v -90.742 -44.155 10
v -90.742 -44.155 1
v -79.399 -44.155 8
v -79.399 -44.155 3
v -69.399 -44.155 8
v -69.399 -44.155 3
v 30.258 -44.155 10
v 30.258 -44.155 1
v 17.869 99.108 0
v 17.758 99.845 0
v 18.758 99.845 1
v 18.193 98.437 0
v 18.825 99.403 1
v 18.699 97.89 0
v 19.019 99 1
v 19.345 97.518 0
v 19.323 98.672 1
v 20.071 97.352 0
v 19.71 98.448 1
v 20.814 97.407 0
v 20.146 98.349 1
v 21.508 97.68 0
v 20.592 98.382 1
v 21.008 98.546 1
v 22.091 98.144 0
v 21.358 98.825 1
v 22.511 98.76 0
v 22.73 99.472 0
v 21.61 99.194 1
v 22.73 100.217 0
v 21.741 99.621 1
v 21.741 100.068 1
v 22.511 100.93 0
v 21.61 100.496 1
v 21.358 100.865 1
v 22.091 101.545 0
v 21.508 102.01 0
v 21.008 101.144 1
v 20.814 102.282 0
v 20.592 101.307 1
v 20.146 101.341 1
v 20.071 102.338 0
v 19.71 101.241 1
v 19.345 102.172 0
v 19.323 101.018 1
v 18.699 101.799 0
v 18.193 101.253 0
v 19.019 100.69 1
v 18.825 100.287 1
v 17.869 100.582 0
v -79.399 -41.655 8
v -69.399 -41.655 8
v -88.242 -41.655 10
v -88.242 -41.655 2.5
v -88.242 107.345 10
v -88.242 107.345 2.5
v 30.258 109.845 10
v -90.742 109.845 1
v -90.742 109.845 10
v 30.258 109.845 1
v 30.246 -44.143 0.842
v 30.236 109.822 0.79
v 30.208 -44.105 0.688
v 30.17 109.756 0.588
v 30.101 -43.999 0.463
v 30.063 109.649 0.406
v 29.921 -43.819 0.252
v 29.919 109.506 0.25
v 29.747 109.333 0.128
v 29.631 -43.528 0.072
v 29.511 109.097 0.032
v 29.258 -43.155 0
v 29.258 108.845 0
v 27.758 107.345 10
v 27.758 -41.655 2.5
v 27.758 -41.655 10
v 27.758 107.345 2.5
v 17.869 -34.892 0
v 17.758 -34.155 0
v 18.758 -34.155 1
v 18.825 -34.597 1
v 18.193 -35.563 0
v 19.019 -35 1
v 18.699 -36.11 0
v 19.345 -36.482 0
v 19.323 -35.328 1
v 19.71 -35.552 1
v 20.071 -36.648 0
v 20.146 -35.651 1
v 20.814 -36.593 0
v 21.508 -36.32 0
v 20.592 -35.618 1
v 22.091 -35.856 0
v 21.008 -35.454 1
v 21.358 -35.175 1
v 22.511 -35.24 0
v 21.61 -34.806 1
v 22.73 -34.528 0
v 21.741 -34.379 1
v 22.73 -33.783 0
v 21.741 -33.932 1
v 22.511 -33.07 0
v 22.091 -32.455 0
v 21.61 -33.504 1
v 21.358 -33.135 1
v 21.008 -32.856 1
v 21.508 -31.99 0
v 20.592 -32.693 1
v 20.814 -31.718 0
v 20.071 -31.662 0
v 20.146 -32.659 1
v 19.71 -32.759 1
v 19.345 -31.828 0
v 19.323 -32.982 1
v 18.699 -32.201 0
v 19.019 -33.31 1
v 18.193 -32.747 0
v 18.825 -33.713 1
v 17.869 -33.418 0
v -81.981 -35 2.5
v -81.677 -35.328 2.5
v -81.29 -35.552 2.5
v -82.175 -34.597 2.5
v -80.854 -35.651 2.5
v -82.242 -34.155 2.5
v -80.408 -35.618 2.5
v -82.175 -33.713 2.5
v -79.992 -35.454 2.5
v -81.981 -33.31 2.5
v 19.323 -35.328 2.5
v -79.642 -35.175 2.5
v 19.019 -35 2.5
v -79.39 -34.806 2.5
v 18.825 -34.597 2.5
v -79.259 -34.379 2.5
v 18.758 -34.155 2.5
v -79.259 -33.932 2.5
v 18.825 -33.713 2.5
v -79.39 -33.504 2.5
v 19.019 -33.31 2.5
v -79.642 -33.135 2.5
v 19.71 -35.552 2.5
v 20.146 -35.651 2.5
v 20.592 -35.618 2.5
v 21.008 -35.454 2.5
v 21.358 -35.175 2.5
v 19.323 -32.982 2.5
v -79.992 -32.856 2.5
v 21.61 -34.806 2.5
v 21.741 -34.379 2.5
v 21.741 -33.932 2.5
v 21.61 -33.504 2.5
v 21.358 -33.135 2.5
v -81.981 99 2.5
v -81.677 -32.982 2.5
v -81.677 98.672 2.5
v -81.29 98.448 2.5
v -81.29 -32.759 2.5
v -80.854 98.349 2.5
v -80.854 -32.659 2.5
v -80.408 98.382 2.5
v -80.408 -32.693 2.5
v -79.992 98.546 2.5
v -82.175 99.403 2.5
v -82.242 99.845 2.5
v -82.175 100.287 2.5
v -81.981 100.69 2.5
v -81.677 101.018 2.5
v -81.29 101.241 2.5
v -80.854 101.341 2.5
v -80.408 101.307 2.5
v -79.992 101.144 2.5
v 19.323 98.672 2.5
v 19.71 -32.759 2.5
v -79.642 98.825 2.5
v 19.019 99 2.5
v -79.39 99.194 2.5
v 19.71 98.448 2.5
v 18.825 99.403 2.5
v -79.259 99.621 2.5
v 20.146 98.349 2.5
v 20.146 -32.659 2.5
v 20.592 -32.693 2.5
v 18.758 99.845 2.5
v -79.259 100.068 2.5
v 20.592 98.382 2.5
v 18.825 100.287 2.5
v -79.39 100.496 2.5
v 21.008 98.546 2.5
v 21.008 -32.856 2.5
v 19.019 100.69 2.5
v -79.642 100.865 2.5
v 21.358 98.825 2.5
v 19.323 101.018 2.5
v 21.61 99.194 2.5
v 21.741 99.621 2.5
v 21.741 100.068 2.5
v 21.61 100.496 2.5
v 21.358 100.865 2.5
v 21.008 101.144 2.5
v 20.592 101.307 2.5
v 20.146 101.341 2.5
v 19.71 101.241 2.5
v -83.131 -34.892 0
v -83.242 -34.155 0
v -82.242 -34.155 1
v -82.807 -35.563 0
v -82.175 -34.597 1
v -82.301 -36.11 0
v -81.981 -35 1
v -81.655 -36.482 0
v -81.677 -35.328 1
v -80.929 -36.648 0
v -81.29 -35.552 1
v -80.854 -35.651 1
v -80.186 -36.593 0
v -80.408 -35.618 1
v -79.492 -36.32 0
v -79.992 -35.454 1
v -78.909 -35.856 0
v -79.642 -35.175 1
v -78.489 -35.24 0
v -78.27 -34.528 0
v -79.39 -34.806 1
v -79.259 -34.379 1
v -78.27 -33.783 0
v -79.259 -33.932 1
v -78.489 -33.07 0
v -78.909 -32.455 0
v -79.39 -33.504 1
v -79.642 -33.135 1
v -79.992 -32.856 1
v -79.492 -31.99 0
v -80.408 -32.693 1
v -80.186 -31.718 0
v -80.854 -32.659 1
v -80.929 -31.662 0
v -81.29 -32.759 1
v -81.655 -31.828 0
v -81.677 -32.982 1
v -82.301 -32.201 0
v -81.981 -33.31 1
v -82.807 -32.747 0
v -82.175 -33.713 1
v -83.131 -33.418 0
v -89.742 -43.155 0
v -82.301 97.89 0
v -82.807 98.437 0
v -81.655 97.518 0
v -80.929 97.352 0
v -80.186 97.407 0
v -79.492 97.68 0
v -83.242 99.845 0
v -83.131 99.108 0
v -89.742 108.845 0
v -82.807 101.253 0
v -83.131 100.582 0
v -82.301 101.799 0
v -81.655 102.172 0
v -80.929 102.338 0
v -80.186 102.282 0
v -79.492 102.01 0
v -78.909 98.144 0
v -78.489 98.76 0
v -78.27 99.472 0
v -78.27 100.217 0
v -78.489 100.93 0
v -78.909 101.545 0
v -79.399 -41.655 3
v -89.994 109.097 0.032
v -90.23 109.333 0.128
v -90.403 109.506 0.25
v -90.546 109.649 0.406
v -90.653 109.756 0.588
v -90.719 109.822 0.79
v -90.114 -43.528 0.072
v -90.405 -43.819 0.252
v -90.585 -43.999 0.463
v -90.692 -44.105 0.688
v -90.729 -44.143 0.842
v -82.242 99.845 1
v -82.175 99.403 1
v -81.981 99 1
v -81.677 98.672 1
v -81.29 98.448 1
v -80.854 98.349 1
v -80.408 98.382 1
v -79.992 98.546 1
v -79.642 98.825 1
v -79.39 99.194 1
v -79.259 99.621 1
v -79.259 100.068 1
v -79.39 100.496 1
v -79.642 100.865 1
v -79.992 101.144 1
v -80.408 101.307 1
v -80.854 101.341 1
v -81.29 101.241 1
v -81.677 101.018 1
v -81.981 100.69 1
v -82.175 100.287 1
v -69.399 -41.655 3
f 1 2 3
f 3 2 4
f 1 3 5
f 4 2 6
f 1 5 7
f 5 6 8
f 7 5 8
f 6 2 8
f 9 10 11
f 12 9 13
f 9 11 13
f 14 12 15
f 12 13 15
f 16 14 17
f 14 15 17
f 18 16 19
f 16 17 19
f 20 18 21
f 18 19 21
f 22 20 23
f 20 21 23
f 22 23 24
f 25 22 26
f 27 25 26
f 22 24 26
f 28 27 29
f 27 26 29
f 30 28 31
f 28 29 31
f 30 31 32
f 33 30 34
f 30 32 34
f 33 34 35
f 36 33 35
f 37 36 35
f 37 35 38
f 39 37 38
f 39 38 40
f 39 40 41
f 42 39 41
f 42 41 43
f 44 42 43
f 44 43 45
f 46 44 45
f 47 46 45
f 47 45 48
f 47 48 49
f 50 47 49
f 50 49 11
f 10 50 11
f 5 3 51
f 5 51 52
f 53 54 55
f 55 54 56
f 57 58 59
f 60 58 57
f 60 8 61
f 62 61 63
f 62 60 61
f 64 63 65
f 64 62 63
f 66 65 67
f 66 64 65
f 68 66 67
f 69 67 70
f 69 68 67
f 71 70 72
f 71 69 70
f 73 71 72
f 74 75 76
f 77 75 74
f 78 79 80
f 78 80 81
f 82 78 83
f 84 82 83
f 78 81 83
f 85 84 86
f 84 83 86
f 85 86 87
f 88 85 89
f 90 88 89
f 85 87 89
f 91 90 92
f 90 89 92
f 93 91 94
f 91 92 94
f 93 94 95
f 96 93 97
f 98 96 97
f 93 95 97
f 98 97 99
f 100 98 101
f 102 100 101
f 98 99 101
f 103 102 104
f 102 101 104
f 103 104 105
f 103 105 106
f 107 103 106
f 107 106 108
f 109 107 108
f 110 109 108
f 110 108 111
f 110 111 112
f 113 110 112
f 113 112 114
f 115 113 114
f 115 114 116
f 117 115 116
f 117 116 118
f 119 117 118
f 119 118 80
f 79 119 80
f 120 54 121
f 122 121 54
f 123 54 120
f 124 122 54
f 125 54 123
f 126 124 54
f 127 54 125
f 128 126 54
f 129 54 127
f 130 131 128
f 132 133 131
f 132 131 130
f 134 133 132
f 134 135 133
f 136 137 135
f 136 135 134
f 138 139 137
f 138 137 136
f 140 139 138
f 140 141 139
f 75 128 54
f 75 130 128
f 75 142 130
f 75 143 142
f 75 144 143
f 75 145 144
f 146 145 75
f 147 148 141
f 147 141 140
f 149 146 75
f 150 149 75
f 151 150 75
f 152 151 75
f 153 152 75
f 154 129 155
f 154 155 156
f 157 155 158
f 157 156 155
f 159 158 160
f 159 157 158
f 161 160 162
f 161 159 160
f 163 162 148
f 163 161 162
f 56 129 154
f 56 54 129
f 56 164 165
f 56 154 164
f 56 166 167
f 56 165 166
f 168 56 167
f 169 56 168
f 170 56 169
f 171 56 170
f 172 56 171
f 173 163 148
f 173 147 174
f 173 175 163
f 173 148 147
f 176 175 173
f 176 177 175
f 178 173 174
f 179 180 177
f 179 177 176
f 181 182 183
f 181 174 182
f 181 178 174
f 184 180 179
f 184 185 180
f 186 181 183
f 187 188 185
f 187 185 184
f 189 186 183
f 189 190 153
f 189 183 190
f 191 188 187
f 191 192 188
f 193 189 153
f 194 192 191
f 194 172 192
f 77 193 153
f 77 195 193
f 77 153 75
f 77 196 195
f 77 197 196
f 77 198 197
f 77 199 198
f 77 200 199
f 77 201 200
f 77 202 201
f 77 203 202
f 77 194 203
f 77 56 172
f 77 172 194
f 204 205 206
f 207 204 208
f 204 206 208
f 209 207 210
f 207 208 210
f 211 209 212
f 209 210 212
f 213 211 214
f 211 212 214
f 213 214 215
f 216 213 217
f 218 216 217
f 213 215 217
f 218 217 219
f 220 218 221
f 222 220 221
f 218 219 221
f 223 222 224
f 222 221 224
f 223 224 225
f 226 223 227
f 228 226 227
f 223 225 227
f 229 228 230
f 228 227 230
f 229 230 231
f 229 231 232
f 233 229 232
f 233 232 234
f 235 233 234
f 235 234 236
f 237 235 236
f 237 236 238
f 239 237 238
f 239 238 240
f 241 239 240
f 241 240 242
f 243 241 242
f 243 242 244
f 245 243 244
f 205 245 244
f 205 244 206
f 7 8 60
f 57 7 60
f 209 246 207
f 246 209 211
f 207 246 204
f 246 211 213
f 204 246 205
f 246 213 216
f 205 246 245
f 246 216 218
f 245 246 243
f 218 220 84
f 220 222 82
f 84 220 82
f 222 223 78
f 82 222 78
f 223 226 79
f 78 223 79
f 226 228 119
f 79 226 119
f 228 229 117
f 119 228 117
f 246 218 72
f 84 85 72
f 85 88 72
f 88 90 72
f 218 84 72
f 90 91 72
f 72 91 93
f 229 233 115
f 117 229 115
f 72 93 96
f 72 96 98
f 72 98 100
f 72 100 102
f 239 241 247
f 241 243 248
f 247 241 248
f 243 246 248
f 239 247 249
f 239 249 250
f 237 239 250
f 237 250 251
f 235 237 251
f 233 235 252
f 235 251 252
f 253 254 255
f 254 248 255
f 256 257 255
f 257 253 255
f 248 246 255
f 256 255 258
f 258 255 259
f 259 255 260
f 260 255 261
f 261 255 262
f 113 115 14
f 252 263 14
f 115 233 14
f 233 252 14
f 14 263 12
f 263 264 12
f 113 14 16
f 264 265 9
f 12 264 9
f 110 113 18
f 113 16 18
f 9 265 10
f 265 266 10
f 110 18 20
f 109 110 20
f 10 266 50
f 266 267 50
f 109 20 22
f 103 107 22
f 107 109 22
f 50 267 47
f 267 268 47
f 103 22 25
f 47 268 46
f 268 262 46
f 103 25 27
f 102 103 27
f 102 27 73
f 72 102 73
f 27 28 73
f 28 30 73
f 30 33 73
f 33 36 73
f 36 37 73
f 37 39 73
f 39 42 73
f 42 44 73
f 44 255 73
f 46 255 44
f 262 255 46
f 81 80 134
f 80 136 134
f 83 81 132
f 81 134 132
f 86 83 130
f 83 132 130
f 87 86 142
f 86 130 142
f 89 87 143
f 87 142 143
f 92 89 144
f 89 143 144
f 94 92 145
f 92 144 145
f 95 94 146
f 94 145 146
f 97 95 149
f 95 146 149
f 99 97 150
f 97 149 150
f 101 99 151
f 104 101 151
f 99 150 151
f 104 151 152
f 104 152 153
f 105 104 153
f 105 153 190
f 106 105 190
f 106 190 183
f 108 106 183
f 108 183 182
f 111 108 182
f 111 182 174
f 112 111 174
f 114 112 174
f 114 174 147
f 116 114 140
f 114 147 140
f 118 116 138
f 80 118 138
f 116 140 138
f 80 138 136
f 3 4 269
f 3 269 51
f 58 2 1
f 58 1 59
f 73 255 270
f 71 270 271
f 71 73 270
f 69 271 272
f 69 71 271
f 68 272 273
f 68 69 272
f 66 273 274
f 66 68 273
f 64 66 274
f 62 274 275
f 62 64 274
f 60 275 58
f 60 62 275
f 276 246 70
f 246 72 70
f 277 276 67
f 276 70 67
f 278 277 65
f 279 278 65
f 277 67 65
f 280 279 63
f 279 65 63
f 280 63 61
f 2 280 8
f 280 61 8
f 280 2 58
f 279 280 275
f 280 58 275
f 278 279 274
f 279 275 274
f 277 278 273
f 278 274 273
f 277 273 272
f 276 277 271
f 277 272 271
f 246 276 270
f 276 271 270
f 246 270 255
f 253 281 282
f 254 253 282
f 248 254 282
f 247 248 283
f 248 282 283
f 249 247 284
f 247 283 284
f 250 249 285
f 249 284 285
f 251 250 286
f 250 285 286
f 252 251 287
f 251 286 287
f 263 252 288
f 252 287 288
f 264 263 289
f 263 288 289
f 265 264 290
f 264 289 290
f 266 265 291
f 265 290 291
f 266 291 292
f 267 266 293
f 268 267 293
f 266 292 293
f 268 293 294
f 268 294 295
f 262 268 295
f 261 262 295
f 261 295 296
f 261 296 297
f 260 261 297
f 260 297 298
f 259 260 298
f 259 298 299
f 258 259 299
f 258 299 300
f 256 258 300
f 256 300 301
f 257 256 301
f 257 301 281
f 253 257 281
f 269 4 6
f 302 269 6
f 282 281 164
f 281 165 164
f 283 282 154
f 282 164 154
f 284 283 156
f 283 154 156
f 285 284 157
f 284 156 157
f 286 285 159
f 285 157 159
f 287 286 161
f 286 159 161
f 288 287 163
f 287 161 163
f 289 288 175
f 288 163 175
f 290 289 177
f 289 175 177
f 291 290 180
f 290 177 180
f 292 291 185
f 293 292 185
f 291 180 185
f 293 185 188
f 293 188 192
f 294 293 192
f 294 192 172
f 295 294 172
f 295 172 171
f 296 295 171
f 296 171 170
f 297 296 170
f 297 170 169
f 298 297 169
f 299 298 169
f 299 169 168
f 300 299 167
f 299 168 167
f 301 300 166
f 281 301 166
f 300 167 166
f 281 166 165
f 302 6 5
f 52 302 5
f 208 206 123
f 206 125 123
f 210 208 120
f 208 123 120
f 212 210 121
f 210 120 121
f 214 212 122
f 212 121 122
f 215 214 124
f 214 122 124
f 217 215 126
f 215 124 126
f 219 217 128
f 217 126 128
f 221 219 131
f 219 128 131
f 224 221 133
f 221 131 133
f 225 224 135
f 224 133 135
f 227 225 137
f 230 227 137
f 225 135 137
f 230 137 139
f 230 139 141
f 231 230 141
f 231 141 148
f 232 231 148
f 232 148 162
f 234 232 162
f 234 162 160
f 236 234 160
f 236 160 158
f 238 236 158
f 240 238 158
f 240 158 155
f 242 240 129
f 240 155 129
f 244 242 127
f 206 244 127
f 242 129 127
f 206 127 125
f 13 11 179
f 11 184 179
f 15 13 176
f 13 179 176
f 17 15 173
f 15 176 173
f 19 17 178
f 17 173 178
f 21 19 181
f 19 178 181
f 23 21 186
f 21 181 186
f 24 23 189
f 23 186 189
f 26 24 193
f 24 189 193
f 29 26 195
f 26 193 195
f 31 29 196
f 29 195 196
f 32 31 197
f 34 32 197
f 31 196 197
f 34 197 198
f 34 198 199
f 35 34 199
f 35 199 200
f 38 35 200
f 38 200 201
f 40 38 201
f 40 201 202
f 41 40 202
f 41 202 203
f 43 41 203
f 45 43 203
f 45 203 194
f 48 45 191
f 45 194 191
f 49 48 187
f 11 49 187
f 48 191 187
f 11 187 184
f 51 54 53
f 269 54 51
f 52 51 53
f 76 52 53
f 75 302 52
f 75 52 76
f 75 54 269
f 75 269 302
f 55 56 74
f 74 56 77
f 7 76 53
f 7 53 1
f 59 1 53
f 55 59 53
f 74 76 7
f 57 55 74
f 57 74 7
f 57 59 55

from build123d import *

# Parameters (mm, degrees)
F0_W           = 121
F0_H           = 154
F1_DEPTH       = 10
F2_T           = -2.5
F4_D           = 3
F4_CSINK_D     = 5
F4_CSINK_ANGLE = 90
F5_R           = 1
F6_W           = 10
F6_H           = 5
F7_DEPTH       = 2.5


with BuildPart() as f1:
    # F0 (on Top) → F1 (new body)
    with BuildSketch(Plane.XY):
        with Locations((-30.2418641299, 32.8448046446)):
            Rectangle(F0_W, F0_H)
    extrude(amount=F1_DEPTH)

    # F2
    f2_openings = [f1.faces().sort_by_distance(p)[0] for p in [
        (-30.241864, 32.844805, 10),
    ]]
    offset(amount=F2_T, openings=f2_openings)

    # F4 (through all)
    with Locations(Plane(origin=(0, 0, 0), x_dir=(1, 0, 0), z_dir=(0, 0, -1))):
        with Locations((-80.7418641299, 34.1551953554), (20.2581358701, 34.1551953554), (-80.7418641299, -99.8448046446), (20.2581358701, -99.8448046446)):
            CounterSinkHole(F4_D / 2, F4_CSINK_D / 2, counter_sink_angle=F4_CSINK_ANGLE)

    # F5
    f5_edges = [f1.edges().sort_by_distance(p)[0] for p in [
        (-30.241864, -44.155195, 0),
        (-90.741864, 32.844805, 0),
        (30.258136, 32.844805, 0),
        (-30.241864, 109.844805, 0),
    ]]
    fillet(f5_edges, radius=F5_R)

    # F6 (on face) → F7 (cut, through all)
    with BuildSketch(Plane.XZ.offset(44.1551953554)):
        with Locations((-74.3994042277, 5.5)):
            Rectangle(F6_W, F6_H)
    extrude(amount=-F7_DEPTH, mode=Mode.SUBTRACT)


solid = f1.part
